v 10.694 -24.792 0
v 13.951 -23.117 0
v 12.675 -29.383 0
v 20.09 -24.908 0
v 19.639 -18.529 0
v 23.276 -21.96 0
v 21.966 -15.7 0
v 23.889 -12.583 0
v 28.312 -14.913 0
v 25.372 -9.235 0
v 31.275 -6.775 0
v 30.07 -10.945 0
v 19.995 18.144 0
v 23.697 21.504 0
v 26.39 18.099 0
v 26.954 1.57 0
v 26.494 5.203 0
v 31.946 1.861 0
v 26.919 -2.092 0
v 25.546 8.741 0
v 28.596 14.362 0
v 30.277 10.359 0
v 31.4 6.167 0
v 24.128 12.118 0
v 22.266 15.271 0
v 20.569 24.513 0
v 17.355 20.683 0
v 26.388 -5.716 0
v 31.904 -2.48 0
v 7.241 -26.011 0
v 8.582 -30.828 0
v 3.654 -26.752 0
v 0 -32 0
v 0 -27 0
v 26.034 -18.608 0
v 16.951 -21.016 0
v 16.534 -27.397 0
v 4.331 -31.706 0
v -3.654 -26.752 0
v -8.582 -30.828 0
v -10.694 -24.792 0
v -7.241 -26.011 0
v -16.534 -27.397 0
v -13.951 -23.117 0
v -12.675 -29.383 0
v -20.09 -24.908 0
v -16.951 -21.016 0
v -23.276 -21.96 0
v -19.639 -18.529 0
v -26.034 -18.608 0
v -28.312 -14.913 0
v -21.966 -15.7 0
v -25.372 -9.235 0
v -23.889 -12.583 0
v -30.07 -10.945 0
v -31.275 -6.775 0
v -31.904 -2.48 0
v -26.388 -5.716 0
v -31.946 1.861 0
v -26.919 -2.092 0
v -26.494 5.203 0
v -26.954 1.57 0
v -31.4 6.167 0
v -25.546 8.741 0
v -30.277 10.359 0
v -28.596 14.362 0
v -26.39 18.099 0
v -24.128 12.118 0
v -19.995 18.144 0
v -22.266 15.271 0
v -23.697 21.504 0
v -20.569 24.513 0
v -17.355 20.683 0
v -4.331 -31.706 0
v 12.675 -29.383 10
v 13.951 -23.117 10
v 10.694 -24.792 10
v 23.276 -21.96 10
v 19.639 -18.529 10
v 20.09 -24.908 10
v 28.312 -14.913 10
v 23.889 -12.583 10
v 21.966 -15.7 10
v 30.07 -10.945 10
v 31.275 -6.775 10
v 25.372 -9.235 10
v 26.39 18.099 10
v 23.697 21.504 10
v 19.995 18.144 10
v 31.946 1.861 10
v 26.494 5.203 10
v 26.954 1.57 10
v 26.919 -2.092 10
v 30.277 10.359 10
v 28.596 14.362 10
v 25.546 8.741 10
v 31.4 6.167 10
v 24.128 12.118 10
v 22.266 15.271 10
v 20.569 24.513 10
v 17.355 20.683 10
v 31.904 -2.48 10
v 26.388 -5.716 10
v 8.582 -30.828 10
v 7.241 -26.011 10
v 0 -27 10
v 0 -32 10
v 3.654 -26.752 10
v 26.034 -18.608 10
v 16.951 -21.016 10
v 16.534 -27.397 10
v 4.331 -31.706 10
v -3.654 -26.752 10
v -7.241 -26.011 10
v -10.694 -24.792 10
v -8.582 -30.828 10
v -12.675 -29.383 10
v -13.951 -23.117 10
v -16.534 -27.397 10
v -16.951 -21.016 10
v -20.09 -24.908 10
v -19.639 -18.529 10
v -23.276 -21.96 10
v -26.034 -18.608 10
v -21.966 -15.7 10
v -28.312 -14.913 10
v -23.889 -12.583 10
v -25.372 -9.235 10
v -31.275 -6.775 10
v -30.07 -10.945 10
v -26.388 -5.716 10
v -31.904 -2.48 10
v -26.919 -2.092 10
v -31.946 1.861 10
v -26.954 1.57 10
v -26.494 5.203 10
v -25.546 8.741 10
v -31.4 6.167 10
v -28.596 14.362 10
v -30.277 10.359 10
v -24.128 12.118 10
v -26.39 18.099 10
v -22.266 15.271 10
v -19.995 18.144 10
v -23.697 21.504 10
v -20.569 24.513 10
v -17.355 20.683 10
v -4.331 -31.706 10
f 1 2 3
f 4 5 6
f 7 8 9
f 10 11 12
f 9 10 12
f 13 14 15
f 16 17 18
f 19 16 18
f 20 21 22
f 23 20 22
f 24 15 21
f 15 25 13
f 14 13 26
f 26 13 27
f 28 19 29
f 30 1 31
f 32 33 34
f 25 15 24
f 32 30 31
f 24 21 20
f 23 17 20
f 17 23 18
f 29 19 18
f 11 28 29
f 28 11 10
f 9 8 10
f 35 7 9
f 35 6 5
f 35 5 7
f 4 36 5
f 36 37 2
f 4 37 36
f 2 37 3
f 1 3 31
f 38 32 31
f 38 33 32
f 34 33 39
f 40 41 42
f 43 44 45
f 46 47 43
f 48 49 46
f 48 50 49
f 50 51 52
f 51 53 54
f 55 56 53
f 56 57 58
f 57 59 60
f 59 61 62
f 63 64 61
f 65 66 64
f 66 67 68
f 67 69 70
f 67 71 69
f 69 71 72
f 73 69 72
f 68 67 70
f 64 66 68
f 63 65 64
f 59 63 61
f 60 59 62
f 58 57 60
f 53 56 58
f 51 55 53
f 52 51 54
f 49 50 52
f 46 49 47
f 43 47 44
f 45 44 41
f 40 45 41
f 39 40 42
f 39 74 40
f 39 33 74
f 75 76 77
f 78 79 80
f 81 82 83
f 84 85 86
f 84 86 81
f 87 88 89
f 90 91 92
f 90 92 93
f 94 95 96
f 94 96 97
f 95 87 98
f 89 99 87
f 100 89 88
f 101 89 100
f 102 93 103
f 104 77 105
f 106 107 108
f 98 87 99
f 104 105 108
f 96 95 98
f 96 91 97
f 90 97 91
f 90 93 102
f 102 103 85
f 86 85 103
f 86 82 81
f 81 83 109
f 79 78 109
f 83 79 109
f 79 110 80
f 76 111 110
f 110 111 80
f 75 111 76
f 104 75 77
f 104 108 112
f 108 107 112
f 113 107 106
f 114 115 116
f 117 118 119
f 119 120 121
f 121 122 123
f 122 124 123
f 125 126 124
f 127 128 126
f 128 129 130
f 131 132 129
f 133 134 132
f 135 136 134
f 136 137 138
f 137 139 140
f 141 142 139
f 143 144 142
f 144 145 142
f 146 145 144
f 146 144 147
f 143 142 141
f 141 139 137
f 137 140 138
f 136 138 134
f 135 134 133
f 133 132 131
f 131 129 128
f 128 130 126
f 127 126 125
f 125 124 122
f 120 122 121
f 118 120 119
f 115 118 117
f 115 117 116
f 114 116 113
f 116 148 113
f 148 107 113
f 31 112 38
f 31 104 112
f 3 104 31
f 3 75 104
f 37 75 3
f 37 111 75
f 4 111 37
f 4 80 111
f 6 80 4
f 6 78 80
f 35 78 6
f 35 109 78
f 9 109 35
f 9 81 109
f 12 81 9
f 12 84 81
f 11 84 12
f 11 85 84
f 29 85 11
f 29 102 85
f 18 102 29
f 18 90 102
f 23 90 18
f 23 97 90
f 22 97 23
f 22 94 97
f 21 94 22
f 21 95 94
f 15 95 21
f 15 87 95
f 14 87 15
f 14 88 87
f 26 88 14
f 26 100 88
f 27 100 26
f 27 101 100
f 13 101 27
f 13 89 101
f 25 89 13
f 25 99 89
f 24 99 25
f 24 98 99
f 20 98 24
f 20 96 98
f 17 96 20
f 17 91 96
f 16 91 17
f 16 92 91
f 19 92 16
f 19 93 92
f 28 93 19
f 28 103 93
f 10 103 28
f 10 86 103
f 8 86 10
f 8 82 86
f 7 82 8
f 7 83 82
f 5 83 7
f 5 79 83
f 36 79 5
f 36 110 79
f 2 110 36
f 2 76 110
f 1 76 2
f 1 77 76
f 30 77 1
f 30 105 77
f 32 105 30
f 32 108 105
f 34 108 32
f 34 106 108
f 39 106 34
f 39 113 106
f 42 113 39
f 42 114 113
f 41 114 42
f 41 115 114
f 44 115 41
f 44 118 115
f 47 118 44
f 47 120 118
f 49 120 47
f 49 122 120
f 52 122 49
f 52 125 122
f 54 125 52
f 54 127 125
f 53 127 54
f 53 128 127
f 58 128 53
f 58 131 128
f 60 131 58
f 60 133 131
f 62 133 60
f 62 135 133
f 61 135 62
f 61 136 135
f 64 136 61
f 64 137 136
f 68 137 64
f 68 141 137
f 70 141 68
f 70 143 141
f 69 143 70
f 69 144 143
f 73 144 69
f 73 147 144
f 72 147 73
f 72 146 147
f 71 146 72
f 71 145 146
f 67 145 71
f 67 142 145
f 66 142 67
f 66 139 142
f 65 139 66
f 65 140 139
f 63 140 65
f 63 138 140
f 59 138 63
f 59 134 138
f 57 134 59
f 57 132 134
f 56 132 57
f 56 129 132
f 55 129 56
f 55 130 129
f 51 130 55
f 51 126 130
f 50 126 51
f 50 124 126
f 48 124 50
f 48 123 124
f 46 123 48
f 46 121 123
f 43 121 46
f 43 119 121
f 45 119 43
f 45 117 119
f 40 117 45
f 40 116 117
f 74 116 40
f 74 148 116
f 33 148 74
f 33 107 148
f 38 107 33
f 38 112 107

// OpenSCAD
$fn = 32;

// ----------------------------------------------------------------------
// Spring clip: 64 mm outside, 5 mm band, 80 degree opening
// ----------------------------------------------------------------------

// --- parameters (mm) ---
outer_r = 32;             // clip outside radius
inner_r = 27;             // clip bore radius
band = 5;                 // band thickness
clip_w = 10;              // clip width
opening = 80;             // opening angle

clip_profile = [[-20.569, 24.513], [-23.697, 21.504], [-26.39, 18.099], [-28.596, 14.362], [-30.277, 10.359], [-31.4, 6.167], [-31.946, 1.861], [-31.904, -2.48], [-31.275, -6.775], [-30.07, -10.945], [-28.312, -14.913], [-26.034, -18.608], [-23.276, -21.96], [-20.09, -24.908], [-16.534, -27.397], [-12.675, -29.383], [-8.582, -30.828], [-4.331, -31.706], [0, -32], [4.331, -31.706], [8.582, -30.828], [12.675, -29.383], [16.534, -27.397], [20.09, -24.908], [23.276, -21.96], [26.034, -18.608], [28.312, -14.913], [30.07, -10.945], [31.275, -6.775], [31.904, -2.48], [31.946, 1.861], [31.4, 6.167], [30.277, 10.359], [28.596, 14.362], [26.39, 18.099], [23.697, 21.504], [20.569, 24.513], [17.355, 20.683], [19.995, 18.144], [22.266, 15.271], [24.128, 12.118], [25.546, 8.741], [26.494, 5.203], [26.954, 1.57], [26.919, -2.092], [26.388, -5.716], [25.372, -9.235], [23.889, -12.583], [21.966, -15.7], [19.639, -18.529], [16.951, -21.016], [13.951, -23.117], [10.694, -24.792], [7.241, -26.011], [3.654, -26.752], [0, -27], [-3.654, -26.752], [-7.241, -26.011], [-10.694, -24.792], [-13.951, -23.117], [-16.951, -21.016], [-19.639, -18.529], [-21.966, -15.7], [-23.889, -12.583], [-25.372, -9.235], [-26.388, -5.716], [-26.919, -2.092], [-26.954, 1.57], [-26.494, 5.203], [-25.546, 8.741], [-24.128, 12.118], [-22.266, 15.271], [-19.995, 18.144], [-17.355, 20.683]];

difference() {
  union() {
    linear_extrude(height = clip_w) polygon(clip_profile);
  }
}
